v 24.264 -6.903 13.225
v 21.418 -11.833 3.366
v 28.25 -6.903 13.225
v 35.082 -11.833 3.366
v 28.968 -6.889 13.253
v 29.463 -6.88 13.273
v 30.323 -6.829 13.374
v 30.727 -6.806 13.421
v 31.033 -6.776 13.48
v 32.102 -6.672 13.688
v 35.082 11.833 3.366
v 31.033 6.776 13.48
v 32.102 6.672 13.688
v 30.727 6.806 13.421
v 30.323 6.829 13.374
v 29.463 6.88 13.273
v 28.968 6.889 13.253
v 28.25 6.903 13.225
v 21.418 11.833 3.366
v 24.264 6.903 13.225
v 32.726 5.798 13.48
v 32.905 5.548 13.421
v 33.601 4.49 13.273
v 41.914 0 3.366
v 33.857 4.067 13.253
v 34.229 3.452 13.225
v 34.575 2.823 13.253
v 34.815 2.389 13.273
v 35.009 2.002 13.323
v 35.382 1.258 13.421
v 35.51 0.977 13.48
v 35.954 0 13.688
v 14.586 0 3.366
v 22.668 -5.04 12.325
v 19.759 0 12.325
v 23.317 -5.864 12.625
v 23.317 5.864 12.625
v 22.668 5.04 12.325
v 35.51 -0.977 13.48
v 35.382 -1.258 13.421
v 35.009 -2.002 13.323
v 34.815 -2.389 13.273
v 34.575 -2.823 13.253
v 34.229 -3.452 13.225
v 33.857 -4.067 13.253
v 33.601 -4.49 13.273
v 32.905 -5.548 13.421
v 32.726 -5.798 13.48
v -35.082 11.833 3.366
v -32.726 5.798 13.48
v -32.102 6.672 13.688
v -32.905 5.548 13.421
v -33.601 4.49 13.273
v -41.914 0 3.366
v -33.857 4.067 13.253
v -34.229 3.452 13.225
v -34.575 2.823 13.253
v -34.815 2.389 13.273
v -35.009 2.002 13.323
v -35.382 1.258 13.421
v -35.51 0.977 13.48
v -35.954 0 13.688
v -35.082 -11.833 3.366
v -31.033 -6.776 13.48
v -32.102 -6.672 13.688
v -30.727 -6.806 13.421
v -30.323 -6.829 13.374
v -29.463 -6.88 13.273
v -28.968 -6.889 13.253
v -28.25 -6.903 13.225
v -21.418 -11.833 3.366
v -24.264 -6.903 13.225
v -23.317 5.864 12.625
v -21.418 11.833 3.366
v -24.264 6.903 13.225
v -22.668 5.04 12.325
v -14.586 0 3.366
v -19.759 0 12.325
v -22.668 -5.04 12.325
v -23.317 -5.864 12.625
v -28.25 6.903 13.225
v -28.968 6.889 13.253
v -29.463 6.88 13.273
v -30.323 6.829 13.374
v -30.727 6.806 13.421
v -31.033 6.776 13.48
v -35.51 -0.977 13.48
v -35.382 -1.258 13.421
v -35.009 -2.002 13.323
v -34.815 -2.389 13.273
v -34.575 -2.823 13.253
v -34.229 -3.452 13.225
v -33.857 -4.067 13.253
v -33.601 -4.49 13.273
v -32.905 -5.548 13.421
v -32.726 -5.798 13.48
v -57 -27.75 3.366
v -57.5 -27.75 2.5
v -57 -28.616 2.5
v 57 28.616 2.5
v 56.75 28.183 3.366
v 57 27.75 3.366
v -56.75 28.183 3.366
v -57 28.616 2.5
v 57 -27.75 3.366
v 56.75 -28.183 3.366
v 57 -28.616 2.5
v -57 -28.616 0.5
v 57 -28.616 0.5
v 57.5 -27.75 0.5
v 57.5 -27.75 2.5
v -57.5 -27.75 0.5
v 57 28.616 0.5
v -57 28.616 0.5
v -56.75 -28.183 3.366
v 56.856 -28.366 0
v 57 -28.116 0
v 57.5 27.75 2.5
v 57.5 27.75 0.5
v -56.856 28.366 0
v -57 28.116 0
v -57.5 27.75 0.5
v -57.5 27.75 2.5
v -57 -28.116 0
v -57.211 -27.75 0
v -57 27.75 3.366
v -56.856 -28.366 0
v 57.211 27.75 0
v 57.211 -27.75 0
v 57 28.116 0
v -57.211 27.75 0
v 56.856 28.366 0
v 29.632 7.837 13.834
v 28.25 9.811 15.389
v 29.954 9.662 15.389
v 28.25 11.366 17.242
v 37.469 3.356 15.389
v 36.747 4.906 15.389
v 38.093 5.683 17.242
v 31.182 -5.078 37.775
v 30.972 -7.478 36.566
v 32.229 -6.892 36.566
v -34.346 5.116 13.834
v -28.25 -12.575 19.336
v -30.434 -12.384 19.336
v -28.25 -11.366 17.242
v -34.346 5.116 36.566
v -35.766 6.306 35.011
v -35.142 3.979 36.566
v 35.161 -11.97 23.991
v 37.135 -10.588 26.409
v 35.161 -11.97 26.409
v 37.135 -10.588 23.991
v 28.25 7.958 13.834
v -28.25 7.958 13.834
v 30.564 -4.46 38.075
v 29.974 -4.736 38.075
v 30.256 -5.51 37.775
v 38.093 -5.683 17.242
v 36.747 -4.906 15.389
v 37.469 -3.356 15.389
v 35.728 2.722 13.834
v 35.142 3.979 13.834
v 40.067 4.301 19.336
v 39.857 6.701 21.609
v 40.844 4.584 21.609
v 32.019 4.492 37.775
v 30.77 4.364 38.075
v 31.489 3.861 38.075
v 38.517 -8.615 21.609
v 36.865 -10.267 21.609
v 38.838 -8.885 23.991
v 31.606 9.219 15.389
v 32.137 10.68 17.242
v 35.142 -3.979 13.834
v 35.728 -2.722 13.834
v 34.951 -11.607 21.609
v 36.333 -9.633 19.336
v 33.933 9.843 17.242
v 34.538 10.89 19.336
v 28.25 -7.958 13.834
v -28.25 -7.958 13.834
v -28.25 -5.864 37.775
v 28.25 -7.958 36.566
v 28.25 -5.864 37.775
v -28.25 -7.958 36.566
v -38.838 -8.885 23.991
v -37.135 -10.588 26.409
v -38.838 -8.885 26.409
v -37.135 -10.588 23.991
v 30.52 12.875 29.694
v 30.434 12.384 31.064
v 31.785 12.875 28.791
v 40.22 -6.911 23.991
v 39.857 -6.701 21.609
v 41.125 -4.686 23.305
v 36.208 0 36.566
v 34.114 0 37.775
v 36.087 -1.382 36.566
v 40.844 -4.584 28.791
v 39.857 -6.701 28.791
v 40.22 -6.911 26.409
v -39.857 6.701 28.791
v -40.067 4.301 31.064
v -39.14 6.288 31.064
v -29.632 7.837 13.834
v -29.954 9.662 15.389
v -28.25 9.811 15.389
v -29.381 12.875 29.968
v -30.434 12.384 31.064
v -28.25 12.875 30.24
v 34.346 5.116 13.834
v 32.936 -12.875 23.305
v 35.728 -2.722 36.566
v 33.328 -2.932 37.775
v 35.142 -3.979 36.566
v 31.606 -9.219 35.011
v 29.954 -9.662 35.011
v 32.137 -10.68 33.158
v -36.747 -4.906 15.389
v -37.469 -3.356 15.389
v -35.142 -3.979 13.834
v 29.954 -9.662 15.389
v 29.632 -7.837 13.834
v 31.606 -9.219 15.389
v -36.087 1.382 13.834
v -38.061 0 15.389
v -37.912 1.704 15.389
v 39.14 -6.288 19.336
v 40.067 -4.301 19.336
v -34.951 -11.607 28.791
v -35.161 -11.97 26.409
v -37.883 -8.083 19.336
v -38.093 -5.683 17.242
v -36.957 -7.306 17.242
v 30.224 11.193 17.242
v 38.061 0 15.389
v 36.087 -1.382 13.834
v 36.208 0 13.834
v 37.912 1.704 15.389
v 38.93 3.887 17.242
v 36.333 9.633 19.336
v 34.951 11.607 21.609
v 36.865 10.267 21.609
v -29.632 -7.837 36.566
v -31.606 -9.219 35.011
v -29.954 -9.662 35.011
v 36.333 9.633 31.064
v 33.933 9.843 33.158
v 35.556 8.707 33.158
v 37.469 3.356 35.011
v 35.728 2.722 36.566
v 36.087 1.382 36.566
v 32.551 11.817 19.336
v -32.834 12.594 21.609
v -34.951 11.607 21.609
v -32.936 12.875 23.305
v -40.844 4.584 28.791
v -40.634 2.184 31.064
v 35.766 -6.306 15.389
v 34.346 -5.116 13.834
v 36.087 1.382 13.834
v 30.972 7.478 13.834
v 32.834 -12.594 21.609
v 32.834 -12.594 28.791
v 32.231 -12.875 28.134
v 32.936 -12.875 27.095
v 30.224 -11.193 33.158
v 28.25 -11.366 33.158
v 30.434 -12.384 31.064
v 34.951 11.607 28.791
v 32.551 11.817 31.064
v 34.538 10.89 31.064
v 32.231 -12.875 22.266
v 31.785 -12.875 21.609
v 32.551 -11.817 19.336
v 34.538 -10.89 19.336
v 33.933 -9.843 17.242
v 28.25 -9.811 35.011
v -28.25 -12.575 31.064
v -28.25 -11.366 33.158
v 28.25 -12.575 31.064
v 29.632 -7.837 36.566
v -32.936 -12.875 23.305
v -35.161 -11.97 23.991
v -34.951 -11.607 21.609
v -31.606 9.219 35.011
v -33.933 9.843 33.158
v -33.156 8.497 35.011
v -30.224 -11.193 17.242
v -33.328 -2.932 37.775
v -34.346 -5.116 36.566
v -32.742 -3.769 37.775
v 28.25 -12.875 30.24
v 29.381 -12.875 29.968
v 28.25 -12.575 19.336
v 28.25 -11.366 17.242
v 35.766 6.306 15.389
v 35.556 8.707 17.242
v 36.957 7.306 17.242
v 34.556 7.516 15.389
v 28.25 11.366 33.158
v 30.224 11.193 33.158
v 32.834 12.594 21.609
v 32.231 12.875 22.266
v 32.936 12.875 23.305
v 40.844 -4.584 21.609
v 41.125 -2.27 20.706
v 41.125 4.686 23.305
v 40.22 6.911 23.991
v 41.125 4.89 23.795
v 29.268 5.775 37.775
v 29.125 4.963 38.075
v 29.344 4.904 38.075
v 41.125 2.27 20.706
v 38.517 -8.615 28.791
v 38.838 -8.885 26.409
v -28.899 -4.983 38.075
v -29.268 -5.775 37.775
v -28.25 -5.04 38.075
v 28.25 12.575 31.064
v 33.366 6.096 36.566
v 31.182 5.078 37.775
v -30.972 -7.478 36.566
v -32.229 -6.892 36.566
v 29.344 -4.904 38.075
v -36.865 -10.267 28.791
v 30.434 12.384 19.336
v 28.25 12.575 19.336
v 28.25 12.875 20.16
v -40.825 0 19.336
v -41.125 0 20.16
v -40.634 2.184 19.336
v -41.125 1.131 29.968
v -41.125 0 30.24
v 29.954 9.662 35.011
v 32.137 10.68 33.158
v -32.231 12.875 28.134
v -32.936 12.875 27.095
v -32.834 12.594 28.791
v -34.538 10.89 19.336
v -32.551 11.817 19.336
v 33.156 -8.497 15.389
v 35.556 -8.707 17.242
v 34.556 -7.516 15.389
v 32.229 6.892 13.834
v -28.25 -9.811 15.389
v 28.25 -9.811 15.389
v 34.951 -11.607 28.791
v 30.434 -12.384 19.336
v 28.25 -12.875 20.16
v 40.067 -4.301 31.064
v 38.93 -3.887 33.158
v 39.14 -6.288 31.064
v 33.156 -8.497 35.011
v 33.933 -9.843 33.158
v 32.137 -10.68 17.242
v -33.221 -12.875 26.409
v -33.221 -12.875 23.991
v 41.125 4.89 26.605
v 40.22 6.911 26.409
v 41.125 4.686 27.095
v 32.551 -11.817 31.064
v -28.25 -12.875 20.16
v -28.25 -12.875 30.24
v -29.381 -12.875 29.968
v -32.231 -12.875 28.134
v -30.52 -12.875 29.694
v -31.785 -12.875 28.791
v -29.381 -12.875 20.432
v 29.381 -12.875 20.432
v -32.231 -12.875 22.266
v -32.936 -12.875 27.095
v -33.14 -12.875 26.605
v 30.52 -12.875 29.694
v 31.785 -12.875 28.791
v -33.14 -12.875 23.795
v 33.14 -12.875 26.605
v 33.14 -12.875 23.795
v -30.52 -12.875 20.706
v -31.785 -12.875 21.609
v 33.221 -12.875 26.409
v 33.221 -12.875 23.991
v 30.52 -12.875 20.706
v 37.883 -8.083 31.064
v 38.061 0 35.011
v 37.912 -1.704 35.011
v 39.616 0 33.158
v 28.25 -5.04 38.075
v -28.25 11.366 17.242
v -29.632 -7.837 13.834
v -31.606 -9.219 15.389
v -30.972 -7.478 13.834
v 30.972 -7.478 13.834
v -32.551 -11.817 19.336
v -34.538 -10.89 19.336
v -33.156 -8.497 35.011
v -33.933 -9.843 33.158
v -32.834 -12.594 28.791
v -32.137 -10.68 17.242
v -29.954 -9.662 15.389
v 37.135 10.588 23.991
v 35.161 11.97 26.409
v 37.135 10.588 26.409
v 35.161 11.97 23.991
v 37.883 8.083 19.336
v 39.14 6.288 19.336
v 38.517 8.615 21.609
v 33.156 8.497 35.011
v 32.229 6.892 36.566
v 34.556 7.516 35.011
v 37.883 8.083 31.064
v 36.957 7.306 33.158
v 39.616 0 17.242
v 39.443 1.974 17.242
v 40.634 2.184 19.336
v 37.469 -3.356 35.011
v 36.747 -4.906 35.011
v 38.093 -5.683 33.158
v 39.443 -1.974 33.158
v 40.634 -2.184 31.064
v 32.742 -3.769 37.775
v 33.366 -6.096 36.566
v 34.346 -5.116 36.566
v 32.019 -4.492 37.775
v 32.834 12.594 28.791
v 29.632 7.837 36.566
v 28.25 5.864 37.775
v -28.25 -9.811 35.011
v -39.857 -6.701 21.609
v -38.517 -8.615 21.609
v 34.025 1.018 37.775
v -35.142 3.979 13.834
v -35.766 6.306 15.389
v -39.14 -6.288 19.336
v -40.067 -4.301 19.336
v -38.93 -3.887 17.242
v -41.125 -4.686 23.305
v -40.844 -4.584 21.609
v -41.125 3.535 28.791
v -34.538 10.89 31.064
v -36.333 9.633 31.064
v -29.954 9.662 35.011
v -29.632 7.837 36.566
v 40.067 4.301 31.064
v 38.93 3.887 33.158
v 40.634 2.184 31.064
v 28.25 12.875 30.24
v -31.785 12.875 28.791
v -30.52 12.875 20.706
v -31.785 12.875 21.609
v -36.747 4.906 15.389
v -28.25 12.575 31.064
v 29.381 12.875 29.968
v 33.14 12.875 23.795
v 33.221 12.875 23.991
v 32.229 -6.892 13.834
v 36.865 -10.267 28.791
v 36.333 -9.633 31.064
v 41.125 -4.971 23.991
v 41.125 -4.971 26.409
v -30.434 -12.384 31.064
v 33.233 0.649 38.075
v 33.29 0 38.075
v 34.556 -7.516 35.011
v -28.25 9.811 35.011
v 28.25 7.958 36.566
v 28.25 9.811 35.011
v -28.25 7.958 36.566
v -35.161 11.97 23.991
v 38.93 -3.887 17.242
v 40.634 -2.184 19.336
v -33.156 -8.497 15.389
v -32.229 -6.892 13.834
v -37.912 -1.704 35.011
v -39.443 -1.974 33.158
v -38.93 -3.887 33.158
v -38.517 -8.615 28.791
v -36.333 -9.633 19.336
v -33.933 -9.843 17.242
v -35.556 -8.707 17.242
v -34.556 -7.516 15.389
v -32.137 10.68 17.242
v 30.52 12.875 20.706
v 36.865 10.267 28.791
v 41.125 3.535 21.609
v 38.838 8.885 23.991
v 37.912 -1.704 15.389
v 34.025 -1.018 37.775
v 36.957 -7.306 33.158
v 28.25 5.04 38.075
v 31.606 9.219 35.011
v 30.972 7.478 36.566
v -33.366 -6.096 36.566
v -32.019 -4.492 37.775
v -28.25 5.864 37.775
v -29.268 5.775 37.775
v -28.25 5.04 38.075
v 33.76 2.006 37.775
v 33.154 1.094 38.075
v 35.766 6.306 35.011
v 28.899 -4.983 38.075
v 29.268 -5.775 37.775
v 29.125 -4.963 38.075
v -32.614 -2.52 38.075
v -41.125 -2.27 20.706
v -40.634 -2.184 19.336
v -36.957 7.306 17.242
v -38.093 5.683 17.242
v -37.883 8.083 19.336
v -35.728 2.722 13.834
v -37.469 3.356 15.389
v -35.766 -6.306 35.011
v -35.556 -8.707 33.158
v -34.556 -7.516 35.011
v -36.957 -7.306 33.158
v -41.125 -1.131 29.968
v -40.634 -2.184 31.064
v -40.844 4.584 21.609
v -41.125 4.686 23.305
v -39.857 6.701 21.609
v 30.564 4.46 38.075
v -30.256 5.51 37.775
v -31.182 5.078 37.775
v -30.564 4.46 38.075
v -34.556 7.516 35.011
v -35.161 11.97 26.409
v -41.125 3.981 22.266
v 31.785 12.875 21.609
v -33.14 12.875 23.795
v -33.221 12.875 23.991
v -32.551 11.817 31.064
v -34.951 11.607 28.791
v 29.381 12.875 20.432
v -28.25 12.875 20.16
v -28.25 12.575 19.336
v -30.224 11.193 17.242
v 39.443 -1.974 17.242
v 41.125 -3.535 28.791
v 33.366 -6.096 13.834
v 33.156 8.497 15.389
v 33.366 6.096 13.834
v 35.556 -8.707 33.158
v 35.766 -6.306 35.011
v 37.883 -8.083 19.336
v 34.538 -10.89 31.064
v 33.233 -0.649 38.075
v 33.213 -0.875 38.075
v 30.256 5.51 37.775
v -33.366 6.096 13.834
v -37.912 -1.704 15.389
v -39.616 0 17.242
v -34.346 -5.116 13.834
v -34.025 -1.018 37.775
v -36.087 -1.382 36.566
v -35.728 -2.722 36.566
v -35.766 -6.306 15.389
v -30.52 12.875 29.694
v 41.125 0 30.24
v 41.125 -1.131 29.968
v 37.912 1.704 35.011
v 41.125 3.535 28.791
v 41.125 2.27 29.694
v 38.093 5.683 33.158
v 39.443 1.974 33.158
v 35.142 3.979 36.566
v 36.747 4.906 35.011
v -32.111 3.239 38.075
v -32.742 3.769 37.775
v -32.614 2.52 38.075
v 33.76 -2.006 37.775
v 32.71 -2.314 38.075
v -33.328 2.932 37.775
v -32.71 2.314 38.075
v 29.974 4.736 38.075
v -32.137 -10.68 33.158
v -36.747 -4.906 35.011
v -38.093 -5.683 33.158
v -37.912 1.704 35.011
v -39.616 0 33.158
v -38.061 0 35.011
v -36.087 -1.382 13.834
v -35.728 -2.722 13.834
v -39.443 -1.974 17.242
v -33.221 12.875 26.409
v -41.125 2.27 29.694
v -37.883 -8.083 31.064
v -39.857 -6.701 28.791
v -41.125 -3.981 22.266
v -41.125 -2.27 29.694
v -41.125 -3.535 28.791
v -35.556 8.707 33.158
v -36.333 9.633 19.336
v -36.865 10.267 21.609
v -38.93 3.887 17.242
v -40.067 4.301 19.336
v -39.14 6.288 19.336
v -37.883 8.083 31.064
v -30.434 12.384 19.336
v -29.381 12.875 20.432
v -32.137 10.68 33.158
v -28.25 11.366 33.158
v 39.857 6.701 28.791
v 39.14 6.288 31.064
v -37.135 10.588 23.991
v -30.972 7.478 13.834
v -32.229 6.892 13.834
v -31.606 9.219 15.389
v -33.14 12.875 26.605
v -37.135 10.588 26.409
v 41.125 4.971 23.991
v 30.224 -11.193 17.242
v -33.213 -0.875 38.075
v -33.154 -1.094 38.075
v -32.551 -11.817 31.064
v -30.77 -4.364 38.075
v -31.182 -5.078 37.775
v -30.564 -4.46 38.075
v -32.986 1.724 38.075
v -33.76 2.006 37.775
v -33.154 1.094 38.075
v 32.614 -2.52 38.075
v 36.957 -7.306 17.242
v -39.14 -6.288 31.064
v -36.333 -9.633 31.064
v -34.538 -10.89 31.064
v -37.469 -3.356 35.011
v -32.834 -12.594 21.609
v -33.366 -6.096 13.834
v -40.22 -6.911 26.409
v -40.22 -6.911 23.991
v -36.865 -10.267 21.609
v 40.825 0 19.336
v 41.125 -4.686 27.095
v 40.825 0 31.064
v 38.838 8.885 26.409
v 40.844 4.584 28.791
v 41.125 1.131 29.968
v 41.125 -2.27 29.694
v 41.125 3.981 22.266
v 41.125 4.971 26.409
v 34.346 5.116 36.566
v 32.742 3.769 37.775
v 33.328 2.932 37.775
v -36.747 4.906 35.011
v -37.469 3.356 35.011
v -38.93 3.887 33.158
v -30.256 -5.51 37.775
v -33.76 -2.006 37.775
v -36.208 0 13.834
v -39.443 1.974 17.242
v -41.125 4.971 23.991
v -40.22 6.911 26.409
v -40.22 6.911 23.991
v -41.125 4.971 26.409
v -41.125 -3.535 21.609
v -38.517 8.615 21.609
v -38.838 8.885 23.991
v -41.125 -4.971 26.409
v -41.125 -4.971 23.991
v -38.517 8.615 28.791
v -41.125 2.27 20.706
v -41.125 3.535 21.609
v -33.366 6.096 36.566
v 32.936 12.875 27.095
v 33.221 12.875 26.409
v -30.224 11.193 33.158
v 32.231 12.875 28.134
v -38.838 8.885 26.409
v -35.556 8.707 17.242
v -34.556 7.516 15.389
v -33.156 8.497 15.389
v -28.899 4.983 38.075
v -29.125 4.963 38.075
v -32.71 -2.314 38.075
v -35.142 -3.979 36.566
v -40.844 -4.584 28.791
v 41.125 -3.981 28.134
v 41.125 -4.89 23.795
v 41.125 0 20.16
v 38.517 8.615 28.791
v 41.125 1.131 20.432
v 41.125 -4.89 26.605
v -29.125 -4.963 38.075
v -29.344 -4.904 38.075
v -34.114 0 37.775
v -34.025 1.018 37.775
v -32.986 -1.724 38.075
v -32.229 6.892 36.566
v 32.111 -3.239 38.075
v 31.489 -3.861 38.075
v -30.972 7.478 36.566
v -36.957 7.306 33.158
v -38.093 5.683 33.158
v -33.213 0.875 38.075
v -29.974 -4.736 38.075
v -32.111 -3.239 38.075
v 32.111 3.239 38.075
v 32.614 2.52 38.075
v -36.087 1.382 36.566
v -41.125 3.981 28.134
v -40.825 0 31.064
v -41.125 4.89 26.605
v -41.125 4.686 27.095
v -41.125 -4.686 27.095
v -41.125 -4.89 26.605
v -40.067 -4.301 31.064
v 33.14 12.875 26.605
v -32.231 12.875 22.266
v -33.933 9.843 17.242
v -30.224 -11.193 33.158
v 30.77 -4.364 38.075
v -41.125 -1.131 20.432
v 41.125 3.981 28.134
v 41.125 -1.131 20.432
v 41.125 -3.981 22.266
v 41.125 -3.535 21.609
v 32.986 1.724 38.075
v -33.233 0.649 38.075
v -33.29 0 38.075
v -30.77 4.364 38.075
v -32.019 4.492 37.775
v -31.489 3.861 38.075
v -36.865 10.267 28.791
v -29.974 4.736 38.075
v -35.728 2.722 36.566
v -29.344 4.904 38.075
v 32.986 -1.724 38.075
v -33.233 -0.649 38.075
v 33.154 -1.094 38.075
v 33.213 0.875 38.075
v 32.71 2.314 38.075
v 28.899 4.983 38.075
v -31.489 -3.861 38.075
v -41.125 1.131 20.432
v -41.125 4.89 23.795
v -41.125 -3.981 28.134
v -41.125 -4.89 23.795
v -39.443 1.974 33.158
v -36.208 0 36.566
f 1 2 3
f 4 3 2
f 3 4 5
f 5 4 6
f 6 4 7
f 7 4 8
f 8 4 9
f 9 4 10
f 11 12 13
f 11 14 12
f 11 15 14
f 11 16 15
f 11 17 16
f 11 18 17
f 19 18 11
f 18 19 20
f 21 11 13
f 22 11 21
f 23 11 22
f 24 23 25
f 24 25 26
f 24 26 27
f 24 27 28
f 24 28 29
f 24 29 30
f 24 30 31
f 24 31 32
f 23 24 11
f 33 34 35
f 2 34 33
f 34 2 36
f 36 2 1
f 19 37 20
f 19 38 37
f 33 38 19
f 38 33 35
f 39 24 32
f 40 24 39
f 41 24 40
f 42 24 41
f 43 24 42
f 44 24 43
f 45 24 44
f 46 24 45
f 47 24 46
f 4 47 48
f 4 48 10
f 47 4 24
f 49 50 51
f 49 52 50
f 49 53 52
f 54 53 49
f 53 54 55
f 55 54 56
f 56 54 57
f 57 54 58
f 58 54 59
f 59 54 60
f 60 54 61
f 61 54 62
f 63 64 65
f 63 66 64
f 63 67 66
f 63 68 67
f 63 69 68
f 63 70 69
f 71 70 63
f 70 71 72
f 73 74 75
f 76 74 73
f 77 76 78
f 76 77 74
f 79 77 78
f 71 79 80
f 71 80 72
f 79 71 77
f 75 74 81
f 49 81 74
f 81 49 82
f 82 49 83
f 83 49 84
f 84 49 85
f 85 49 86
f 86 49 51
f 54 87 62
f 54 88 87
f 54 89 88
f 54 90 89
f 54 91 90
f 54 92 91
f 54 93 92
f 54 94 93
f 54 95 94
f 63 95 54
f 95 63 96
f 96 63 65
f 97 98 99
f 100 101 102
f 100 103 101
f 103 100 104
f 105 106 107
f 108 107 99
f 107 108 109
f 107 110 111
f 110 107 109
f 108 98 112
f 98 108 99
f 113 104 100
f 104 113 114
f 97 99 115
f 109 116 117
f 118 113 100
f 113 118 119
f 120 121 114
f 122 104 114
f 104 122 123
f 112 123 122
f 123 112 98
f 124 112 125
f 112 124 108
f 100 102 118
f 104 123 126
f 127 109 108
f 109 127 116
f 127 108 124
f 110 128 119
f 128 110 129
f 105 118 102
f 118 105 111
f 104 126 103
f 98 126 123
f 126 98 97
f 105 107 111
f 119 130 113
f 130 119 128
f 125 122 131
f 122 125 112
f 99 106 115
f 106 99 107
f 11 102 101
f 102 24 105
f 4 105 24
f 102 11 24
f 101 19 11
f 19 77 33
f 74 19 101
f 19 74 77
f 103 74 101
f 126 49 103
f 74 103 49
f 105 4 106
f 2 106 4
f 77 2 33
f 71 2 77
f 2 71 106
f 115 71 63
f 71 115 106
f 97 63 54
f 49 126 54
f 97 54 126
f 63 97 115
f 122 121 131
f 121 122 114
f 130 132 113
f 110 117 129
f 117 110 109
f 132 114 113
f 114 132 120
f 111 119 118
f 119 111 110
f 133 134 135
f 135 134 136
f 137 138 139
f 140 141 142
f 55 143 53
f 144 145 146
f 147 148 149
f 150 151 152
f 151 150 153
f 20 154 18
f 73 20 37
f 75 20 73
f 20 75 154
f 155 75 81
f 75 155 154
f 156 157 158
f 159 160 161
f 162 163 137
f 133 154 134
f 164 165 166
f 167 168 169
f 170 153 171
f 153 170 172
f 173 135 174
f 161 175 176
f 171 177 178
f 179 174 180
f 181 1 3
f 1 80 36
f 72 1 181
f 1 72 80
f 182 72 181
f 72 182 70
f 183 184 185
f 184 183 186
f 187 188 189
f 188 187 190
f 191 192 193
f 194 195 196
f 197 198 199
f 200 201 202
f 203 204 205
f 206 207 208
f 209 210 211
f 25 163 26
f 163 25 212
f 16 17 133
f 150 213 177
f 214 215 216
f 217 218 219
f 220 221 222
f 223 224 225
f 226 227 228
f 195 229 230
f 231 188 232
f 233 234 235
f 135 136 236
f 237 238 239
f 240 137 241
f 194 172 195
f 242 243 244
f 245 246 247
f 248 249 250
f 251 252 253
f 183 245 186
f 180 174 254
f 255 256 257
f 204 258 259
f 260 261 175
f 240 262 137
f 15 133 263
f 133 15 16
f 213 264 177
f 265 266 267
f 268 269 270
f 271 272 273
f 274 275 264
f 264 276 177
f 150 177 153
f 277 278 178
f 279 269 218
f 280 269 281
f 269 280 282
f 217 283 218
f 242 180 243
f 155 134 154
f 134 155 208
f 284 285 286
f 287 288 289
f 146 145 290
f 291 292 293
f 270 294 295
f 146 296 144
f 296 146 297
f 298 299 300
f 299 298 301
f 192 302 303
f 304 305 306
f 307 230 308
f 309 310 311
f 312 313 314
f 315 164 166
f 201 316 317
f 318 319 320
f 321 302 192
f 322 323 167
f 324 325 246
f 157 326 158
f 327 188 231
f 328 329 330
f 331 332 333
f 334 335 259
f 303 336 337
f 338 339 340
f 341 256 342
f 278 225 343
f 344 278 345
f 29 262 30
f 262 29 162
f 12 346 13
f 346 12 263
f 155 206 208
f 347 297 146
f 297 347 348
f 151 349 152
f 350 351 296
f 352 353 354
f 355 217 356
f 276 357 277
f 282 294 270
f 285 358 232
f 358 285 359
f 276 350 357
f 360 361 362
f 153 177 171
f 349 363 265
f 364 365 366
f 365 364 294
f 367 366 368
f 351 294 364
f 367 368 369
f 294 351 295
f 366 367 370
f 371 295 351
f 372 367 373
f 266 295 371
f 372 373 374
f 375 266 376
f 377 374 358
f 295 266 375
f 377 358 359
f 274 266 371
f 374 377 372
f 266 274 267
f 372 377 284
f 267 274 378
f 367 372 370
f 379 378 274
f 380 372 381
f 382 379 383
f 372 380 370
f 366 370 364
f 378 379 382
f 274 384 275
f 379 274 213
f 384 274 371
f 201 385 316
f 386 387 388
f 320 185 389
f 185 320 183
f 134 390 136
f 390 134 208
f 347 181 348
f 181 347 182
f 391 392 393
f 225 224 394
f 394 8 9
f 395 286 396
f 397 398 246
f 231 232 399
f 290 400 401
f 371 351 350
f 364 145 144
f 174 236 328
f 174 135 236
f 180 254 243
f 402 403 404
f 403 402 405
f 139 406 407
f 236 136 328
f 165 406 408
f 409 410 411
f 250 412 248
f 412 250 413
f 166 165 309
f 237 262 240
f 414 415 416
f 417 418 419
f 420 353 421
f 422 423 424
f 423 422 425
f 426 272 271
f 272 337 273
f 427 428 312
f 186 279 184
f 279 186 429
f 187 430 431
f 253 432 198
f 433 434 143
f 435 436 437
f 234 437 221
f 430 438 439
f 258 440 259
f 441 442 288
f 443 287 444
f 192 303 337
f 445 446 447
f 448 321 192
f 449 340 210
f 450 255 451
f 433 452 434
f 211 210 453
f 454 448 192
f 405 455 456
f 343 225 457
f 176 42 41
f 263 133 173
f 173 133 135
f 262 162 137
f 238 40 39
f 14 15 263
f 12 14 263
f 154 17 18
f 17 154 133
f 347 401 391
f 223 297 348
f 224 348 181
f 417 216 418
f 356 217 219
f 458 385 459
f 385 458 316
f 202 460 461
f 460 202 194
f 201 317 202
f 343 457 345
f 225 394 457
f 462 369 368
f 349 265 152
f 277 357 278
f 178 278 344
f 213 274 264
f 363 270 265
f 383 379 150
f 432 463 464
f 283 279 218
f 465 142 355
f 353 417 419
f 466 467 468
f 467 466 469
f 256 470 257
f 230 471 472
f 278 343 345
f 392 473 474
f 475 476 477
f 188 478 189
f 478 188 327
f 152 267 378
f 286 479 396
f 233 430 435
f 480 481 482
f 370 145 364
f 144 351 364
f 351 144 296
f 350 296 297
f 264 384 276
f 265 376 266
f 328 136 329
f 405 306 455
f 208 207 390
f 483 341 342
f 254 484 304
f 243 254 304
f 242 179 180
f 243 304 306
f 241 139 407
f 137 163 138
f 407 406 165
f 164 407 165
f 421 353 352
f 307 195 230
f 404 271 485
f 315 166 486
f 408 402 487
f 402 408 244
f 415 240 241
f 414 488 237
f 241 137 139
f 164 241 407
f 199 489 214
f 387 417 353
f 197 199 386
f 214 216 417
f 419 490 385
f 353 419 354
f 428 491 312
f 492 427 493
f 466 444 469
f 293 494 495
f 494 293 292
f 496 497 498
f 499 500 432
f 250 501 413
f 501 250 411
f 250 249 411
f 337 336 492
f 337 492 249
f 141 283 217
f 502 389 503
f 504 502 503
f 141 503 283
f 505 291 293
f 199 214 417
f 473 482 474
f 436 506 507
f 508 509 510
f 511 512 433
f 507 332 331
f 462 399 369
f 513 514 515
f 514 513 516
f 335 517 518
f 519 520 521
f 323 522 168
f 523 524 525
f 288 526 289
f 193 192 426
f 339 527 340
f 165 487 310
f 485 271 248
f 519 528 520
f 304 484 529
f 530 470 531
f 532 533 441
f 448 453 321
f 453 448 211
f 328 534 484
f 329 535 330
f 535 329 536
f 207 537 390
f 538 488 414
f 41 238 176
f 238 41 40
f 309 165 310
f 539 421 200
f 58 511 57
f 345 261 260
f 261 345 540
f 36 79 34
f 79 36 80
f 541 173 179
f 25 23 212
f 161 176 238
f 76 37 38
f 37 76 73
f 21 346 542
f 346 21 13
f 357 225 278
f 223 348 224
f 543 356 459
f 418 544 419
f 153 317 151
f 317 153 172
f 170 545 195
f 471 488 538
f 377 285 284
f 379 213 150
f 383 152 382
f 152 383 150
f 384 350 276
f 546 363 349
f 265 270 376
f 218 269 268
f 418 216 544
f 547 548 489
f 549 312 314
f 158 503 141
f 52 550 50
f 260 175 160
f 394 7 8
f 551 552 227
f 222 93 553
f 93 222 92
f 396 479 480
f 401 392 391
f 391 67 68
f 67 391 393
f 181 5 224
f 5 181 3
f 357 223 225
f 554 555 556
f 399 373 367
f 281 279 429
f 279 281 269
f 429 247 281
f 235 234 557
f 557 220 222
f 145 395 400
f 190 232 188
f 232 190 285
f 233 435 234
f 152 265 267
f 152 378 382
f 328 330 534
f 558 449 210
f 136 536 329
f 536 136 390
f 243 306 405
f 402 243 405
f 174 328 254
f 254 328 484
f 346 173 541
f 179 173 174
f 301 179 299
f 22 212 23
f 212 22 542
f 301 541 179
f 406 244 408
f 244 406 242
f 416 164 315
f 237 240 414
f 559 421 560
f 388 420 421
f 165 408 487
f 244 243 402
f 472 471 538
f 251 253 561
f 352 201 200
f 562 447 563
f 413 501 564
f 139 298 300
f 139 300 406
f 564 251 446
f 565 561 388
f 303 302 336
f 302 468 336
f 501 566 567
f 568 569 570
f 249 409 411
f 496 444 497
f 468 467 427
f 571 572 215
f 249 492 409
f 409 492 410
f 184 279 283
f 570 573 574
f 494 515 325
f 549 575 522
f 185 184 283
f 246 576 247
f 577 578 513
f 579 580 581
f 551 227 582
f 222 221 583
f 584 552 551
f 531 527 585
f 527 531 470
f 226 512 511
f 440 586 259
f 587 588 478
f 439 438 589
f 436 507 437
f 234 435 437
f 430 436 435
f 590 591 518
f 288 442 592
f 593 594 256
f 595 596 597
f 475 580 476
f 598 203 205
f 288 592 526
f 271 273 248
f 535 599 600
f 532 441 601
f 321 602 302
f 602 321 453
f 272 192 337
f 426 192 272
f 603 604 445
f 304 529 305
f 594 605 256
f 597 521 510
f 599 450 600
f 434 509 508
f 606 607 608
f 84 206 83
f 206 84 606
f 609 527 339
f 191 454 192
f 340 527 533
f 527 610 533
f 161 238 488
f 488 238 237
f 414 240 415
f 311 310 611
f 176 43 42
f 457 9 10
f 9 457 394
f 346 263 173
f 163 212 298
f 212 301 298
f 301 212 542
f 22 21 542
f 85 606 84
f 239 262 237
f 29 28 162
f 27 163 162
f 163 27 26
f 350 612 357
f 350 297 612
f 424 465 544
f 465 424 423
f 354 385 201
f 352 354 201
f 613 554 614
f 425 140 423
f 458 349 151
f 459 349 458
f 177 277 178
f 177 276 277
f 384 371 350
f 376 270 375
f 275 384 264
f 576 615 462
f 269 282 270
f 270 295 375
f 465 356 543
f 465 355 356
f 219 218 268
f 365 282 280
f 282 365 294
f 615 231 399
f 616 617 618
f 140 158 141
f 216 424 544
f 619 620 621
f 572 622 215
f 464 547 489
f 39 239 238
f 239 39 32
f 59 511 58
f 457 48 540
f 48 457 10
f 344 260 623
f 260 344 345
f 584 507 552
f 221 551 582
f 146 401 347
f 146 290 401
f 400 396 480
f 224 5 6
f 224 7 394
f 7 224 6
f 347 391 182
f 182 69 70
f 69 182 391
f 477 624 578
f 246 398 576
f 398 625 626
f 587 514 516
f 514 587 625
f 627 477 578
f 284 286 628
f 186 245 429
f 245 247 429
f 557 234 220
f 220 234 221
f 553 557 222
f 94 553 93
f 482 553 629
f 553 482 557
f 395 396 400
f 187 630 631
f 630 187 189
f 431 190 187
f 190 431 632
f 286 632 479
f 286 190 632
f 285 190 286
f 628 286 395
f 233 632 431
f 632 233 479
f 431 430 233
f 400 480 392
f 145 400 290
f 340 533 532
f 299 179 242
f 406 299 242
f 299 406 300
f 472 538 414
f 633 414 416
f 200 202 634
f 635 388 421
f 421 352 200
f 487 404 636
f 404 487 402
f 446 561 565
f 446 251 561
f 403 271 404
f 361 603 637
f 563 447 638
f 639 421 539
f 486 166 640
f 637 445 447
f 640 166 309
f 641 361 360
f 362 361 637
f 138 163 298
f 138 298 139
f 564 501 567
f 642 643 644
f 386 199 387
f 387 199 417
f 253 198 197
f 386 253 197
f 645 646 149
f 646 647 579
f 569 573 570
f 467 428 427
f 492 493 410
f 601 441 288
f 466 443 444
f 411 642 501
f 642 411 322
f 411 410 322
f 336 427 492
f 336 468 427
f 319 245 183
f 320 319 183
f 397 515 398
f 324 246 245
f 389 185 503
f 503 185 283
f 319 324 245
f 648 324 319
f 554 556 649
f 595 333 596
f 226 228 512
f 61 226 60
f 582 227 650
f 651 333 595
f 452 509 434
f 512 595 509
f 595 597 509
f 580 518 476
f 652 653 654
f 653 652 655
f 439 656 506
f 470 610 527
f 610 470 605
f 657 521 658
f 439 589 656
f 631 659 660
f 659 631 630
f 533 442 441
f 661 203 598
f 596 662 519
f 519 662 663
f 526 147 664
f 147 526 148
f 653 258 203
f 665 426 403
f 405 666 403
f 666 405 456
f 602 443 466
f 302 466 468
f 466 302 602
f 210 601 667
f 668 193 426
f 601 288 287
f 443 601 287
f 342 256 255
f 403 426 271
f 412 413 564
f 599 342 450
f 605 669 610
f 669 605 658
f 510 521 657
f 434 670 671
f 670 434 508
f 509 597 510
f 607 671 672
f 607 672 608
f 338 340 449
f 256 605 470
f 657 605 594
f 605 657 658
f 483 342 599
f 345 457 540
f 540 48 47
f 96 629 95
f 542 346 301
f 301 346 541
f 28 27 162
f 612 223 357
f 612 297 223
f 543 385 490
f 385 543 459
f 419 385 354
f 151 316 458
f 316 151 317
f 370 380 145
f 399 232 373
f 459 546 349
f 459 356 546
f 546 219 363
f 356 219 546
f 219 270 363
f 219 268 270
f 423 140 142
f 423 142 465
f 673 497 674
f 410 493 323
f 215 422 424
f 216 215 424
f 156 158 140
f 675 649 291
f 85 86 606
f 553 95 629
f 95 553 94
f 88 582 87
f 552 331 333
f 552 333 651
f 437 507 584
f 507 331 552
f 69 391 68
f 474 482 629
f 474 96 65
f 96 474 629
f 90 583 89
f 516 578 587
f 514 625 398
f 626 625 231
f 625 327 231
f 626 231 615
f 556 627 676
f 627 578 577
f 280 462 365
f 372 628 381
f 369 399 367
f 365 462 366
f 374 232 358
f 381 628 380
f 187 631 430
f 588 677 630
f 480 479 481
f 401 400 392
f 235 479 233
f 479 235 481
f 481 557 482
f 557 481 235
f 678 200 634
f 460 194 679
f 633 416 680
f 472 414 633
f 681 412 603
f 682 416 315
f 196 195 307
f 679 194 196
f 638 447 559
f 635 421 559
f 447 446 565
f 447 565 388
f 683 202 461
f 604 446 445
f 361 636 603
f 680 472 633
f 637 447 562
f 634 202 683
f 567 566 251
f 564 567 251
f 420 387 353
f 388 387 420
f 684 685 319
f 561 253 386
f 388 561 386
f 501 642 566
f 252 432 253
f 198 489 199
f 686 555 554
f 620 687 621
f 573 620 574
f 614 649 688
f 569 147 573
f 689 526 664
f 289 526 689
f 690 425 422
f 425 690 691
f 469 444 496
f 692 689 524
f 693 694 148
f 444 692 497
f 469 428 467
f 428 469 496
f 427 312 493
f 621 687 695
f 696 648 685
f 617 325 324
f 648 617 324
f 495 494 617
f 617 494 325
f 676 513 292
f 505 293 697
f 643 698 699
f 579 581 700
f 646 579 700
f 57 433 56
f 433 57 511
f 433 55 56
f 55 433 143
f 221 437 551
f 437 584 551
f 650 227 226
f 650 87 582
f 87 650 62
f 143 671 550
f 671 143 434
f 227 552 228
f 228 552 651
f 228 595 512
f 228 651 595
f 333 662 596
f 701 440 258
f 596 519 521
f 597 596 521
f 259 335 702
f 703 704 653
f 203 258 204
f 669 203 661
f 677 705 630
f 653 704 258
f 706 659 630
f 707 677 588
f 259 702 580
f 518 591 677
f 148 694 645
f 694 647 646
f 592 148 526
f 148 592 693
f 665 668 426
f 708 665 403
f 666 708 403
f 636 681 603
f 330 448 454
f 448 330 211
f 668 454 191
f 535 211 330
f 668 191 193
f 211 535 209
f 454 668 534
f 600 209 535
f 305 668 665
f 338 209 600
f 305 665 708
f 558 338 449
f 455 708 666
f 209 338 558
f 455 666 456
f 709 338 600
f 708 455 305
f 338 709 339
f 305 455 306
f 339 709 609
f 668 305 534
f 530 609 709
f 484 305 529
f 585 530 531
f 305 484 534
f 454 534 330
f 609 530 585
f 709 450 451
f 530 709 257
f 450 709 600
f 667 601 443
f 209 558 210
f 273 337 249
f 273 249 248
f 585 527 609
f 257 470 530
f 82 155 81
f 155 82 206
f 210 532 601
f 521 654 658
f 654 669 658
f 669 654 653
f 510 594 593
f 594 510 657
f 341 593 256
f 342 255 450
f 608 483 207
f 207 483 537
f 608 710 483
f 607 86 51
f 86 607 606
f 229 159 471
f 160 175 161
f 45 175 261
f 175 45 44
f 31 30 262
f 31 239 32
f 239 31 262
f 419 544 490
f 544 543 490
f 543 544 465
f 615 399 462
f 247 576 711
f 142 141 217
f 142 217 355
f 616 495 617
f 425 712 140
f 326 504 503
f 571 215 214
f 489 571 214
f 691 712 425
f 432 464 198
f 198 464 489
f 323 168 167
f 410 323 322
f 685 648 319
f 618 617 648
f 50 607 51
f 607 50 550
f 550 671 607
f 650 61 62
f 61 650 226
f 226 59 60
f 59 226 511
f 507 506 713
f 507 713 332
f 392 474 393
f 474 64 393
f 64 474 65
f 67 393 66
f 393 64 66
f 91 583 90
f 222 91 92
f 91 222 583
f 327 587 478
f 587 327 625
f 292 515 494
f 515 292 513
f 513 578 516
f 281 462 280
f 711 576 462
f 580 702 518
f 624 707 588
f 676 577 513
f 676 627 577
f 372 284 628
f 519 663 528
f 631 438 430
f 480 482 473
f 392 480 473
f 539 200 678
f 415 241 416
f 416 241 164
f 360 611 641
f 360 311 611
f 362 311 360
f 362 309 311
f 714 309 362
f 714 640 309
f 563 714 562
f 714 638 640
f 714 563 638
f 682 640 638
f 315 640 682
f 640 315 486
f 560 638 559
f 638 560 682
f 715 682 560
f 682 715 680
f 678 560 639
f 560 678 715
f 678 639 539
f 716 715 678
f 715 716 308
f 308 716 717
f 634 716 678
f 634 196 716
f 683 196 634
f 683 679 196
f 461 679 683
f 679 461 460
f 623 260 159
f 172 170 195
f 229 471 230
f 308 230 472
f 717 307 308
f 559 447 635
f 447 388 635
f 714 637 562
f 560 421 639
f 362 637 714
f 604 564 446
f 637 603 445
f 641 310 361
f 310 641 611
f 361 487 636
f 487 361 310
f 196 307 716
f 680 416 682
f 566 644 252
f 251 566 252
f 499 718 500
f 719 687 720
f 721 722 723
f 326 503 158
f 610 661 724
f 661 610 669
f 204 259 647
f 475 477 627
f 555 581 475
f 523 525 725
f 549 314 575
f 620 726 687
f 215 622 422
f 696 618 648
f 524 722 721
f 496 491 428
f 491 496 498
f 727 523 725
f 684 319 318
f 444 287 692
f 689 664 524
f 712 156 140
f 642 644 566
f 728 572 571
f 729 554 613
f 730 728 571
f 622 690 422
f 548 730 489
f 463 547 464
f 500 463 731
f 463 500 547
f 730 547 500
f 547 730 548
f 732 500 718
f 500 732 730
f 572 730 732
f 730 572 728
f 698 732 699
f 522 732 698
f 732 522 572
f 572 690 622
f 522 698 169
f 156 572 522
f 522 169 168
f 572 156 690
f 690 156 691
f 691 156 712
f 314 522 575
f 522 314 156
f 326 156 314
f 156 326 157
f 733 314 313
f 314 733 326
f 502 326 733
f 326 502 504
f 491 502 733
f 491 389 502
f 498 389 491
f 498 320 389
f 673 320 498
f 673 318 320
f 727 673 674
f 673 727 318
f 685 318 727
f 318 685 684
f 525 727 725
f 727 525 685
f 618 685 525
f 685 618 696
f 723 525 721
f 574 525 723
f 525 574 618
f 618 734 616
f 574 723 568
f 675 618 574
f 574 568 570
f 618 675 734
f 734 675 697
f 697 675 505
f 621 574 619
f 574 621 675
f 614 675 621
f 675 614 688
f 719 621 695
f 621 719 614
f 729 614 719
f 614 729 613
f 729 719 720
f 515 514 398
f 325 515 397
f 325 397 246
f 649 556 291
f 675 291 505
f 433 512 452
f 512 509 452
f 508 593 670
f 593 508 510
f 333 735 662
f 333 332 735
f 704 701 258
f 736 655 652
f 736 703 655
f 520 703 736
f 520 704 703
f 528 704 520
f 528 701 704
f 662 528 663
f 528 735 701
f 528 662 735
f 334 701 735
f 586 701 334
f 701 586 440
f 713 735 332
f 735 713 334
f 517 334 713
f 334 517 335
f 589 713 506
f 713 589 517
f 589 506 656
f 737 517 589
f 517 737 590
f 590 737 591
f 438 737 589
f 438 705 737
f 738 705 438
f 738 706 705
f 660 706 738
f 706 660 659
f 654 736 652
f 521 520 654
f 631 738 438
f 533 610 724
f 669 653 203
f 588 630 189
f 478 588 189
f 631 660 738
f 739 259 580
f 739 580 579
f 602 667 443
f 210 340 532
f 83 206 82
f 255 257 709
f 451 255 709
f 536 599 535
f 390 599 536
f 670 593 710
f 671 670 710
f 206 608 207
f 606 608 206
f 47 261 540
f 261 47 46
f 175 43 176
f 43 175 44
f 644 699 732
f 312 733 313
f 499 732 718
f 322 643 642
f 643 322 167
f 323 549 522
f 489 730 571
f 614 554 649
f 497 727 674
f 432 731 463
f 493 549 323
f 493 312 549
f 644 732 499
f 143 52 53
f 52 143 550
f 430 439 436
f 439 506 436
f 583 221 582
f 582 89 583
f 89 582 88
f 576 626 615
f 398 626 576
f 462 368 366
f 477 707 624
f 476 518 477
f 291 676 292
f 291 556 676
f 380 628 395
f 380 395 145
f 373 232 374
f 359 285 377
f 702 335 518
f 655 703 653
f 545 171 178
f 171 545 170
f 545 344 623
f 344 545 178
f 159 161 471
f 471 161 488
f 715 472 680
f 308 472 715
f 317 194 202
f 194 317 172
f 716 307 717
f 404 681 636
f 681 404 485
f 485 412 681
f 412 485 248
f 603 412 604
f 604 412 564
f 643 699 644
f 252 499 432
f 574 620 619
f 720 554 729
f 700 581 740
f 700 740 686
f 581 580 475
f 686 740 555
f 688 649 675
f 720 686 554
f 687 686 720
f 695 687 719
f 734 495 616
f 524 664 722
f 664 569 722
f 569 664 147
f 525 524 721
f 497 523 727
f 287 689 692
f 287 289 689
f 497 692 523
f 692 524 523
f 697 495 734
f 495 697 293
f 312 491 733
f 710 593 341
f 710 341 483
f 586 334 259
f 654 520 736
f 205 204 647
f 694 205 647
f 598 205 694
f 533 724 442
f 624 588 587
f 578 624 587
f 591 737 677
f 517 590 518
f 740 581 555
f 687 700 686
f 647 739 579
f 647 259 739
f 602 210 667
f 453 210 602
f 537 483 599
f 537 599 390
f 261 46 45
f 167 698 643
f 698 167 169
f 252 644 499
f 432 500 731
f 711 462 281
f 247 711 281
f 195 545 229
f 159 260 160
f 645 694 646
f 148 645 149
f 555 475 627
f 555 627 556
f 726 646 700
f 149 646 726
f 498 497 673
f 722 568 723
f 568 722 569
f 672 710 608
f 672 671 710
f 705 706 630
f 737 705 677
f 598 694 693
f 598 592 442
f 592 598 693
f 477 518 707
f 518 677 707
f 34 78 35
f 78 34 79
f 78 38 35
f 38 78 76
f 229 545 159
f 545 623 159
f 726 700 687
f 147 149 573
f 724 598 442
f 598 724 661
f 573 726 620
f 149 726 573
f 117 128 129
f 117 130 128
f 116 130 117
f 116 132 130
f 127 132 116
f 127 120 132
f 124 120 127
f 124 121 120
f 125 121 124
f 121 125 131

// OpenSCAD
part = 2;

base_thick = 3;

if(part == 1){
    square_stamp(size = [78,38.25]);
}

if(part ==2){
    square_stamp(size = [113, 55.5]);
}

module square_stamp(size = [50,50]){
    min_rad = 1;
    x = size[0];
    y = size[1];
    difference(){
        union(){
            //the stamp!
            translate([0,0,base_thick/2]) minkowski(){
                cube([x, y, base_thick-min_rad], center=true);
                sphere(r=min_rad, $fn=6);
            }
            
            //a handle!
            for(i=[0,1]) mirror([i,0,0]) translate([x/4,0,base_thick]) sphere(r=y/4, $fn=6);
                
            hull(){
                for(i=[0,1]) mirror([i,0,0]) translate([x/4,0,base_thick+y*.4]) intersection(){
                    sphere(r=y/4, $fn=36);
                    cube([y/2-2, y/2-2, y/2-2], center=true);
                }
            }
        }
        
        translate([0,0,-100]) cube([200,200,200], center=true);
    }
}
